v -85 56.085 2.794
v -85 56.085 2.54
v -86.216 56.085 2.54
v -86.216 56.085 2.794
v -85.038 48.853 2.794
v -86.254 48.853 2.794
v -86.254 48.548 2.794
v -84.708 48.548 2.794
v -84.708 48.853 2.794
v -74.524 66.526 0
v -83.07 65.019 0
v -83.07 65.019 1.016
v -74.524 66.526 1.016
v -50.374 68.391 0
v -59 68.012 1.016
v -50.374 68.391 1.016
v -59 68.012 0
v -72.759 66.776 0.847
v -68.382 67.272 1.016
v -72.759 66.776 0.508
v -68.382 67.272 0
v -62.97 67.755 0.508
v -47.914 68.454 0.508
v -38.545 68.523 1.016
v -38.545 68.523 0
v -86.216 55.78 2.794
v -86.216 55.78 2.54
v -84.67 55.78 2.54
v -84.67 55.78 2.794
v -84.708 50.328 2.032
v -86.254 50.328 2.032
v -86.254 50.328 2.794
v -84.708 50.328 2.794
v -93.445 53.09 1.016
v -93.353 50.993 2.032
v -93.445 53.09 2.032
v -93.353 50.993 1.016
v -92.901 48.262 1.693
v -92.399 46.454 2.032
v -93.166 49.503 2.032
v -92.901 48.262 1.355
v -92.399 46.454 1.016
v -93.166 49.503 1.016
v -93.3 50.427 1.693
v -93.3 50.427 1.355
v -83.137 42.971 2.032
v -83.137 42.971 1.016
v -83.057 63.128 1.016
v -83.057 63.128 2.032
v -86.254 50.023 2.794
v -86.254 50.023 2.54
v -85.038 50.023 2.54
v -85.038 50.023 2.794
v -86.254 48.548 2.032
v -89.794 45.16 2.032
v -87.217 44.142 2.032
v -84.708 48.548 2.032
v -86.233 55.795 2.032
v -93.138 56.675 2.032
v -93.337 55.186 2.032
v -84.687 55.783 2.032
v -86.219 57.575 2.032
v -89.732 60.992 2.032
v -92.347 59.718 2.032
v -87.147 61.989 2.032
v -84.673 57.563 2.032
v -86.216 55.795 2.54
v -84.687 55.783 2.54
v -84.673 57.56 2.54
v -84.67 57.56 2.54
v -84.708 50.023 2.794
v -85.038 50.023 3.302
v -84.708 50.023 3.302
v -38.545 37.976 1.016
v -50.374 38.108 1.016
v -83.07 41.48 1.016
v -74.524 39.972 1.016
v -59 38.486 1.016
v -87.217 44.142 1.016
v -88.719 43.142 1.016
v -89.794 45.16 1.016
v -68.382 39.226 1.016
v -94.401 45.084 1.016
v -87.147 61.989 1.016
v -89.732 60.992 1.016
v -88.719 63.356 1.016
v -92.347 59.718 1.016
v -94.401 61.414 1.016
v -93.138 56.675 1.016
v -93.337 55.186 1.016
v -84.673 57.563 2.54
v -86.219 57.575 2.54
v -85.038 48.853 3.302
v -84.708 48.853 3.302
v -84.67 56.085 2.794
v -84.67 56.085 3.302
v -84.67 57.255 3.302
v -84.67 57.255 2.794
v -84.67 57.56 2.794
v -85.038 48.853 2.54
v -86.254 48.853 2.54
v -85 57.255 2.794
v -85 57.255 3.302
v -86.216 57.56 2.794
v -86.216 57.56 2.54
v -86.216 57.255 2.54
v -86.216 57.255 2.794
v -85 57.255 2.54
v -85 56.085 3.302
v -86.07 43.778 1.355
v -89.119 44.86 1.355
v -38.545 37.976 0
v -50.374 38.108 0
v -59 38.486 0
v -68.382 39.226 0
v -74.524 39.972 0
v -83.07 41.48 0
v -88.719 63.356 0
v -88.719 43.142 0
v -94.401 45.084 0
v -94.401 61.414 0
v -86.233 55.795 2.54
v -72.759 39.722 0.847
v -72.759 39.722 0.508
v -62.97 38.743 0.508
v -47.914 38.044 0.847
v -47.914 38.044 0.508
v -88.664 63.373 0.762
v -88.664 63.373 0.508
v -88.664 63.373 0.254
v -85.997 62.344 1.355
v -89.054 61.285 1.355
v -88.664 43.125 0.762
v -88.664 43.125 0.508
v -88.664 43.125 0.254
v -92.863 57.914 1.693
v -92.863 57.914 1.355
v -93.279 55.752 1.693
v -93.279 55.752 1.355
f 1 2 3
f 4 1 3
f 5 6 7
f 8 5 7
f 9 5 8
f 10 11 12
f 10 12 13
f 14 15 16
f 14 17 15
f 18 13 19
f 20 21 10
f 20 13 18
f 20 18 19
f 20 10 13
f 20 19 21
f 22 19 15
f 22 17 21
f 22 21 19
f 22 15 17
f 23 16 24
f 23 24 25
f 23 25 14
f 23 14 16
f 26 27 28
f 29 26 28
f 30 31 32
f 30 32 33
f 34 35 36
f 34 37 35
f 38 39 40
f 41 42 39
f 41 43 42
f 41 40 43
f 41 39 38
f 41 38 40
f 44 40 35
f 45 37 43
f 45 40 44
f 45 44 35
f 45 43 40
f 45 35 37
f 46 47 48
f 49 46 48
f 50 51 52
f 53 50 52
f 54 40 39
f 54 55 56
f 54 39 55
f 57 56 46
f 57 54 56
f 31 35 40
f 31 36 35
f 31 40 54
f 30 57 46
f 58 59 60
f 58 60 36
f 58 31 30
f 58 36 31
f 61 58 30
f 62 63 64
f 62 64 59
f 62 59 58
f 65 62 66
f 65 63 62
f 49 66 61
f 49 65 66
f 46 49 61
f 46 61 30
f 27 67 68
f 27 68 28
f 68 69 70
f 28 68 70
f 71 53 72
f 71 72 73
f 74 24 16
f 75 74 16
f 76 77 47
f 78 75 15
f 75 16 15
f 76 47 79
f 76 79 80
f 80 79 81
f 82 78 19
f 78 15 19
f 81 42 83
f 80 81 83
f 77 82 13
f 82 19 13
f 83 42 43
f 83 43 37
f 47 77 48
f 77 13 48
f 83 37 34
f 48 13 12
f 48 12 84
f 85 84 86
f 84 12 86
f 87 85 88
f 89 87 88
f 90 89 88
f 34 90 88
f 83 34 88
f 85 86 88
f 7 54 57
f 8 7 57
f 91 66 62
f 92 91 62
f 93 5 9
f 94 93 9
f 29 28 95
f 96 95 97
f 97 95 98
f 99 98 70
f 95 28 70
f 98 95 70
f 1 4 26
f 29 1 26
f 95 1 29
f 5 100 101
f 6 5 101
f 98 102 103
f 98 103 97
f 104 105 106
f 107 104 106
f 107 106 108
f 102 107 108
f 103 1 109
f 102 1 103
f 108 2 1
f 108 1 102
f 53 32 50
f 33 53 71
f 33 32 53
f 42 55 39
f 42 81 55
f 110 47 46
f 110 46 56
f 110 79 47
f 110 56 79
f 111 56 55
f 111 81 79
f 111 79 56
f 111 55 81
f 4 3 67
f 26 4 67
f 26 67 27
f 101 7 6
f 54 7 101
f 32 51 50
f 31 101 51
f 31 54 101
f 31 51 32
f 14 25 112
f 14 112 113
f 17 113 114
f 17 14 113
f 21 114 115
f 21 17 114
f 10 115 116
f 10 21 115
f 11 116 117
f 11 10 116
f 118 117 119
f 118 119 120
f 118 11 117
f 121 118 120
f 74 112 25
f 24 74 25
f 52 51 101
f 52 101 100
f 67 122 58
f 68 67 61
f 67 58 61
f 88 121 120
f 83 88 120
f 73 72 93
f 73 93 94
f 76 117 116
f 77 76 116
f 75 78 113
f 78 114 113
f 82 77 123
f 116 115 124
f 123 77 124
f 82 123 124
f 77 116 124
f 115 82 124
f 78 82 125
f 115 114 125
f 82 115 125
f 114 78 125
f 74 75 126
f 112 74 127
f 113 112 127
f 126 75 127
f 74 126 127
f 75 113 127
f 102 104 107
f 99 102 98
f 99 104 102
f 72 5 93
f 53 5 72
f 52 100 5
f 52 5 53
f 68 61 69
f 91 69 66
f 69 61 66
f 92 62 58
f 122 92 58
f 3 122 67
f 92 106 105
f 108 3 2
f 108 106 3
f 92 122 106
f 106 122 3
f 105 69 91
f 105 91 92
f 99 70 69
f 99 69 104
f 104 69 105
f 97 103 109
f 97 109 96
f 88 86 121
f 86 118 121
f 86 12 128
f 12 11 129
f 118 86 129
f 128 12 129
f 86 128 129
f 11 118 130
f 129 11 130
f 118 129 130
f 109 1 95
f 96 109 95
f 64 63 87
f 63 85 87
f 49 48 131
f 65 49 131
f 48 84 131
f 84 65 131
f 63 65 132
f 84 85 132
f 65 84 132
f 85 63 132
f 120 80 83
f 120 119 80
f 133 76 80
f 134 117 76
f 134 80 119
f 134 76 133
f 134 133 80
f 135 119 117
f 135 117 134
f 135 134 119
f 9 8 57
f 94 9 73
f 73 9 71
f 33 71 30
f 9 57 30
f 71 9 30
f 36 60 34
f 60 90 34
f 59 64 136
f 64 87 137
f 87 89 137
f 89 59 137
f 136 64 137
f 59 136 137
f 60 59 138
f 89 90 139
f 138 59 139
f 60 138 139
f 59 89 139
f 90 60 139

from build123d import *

# Parameters (mm, degrees)
F1_DEPTH = 1.016
F3_DEPTH = 1.016
F4_W     = 1.5461742878
F4_H     = 1.7800107598
F5_DEPTH = 0.508
F6_W     = 0.3297105432
F6_H     = 1.169860363
F7_DEPTH = 0.762
F8_DEPTH = 0.254


with BuildPart() as f1:
    # F0 (on Top) → F1 (new body)
    with BuildSketch(Plane.XY):
        with BuildLine():
            add(Edge.make_bspline(
                [(-83.0695168812, 65.0185172639), (-81.2073282212, 65.3529949208), (-77.5617974949, 66.0077881765), (-72.8140528821, 66.8662404849), (-62.7985653809, 67.8312138759), (-56.6385059142, 68.1307697908), (-49.0098225635, 68.4964166124), (-41.736601245, 68.5281022888), (-38.5453496012, 68.5228027941)],
                knots=[0, 0, 0, 0, 0.1161322033, 0.2273472739, 0.3832821232, 0.5081069087, 0.6553322951, 0.7776776585, 0.7776776585, 0.7776776585, 0.7776776585], degree=3))
            add(Edge.make_bspline(
                [(-83.0695168812, 65.0185172639), (-84.009305045, 64.7533696868), (-85.8864659081, 64.2237560209), (-88.6669817794, 63.3740574177), (-91.5588504625, 62.4778286964), (-93.4526108955, 61.7689145327), (-94.4005846977, 61.4140480757)],
                knots=[0, 0, 0, 0, 0.2478868969, 0.4951366694, 0.7472767924, 1, 1, 1, 1], degree=3))
            Line((-94.4005846977, 61.4140480757), (-94.4005846977, 45.0842863971))
            add(Edge.make_bspline(
                [(-83.0695168812, 41.4798172089), (-84.009305045, 41.7449647859), (-85.8864659081, 42.2745784519), (-88.6669817794, 43.1242770551), (-91.5588504625, 44.0205057763), (-93.4526108955, 44.7294199401), (-94.4005846977, 45.0842863971)],
                knots=[0, 0, 0, 0, 0.2478868969, 0.4951366694, 0.7472767924, 1, 1, 1, 1], degree=3))
            add(Edge.make_bspline(
                [(-83.0695168812, 41.4798172089), (-81.2073282212, 41.1453395519), (-77.5617974949, 40.4905462962), (-72.8140528821, 39.6320939878), (-62.7985653809, 38.6671205968), (-56.6385059142, 38.367564682), (-49.0098225635, 38.0019178604), (-41.736601245, 37.970232184), (-38.5453496012, 37.9755316787)],
                knots=[0, 0, 0, 0, 0.1161322033, 0.2273472739, 0.3832821232, 0.5081069087, 0.6553322951, 0.7776776585, 0.7776776585, 0.7776776585, 0.7776776585], degree=3))
            Line((-38.5453496012, 37.9755316787), (-38.5453496012, 68.5228027941))
        make_face()
    extrude(amount=F1_DEPTH)

    # F2 (on face) → F3 (join)
    with BuildSketch(Plane.XY.offset(1.016)):
        with BuildLine():
            Line((-83.1365770774, 42.9710840408), (-83.0574043404, 63.1276703968))
            add(Edge.make_bspline(
                [(-83.0574043404, 63.1276703968), (-84.0360073876, 62.8789505229), (-86.0237511963, 62.3737493681), (-89.1074437373, 61.3565198736), (-91.2456775332, 60.2747276068), (-92.3467808204, 59.7176486647)],
                knots=[0, 0, 0, 0, 0.319895777, 0.6497740345, 1, 1, 1, 1], degree=3))
            add(Edge.make_bspline(
                [(-92.3467808204, 59.7176486647), (-92.5252253831, 59.1278593609), (-92.8969492909, 57.8992493015), (-93.3515589868, 55.7309907883), (-93.413163937, 53.9980307219), (-93.4454426169, 53.0900247395)],
                knots=[0, 0, 0, 0, 0.3053144509, 0.6360108656, 1, 1, 1, 1], degree=3))
            add(Edge.make_bspline(
                [(-92.3988789961, 46.4539746173), (-92.572684876, 47.0451475201), (-92.9347457867, 48.2766398013), (-93.3723083812, 50.4484026639), (-93.4202979076, 52.1817932047), (-93.4454426169, 53.0900247395)],
                knots=[0, 0, 0, 0, 0.3053144509, 0.6360108656, 1, 1, 1, 1], degree=3))
            add(Edge.make_bspline(
                [(-83.1365770774, 42.9710840408), (-84.1131960732, 43.2274838005), (-86.0969098659, 43.7482843808), (-89.1725162602, 44.7897068882), (-91.3021859002, 45.8882629855), (-92.3988789961, 46.4539746173)],
                knots=[0, 0, 0, 0, 0.319895777, 0.6497740345, 1, 1, 1, 1], degree=3))
        make_face()
    extrude(amount=F3_DEPTH)

    # F4 (on face) → F5 (join)
    with BuildSketch(Plane.XY.offset(2.032)):
        with Locations((-85.4812115431, 49.4383238256)):
            Rectangle(F4_W, F4_H)
        Polygon((-86.2188425351, 57.5750998045), (-86.2328256717, 55.7951439688), (-84.6866990927, 55.7829977691), (-84.6727159562, 57.5629536048), align=None)
    extrude(amount=F5_DEPTH)

    # F6 (on face) → F7 (join)
    with BuildSketch(Plane.XY.offset(2.54)):
        with Locations((-84.8346985877, 56.6699057817)):
            Rectangle(F6_W, F6_H)
        with Locations((-84.8729796708, 49.4383238256)):
            Rectangle(F6_W, F6_H)
    extrude(amount=F7_DEPTH)

    # F6 (on face) → F8 (join)
    with BuildSketch(Plane.XY.offset(2.54)):
        Polygon((-86.2160176039, 57.2548359632), (-84.9995538592, 57.2548359632), (-84.6698433161, 57.2548359632), (-84.6698433161, 57.5599111617), (-86.2160176039, 57.5599111617), align=None)
        Polygon((-84.9995538592, 56.0849756002), (-86.2160176039, 56.0849756002), (-86.2160176039, 55.7799004018), (-84.6698433161, 55.7799004018), (-84.6698433161, 56.0849756002), align=None)
        Polygon((-86.254298687, 50.3283292055), (-86.254298687, 50.0232540071), (-85.0378349423, 50.0232540071), (-84.7081243992, 50.0232540071), (-84.7081243992, 50.3283292055), align=None)
        Polygon((-85.0378349423, 48.8533936441), (-86.254298687, 48.8533936441), (-86.254298687, 48.5483184457), (-84.7081243992, 48.5483184457), (-84.7081243992, 48.8533936441), align=None)
    extrude(amount=F8_DEPTH)


solid = f1.part
